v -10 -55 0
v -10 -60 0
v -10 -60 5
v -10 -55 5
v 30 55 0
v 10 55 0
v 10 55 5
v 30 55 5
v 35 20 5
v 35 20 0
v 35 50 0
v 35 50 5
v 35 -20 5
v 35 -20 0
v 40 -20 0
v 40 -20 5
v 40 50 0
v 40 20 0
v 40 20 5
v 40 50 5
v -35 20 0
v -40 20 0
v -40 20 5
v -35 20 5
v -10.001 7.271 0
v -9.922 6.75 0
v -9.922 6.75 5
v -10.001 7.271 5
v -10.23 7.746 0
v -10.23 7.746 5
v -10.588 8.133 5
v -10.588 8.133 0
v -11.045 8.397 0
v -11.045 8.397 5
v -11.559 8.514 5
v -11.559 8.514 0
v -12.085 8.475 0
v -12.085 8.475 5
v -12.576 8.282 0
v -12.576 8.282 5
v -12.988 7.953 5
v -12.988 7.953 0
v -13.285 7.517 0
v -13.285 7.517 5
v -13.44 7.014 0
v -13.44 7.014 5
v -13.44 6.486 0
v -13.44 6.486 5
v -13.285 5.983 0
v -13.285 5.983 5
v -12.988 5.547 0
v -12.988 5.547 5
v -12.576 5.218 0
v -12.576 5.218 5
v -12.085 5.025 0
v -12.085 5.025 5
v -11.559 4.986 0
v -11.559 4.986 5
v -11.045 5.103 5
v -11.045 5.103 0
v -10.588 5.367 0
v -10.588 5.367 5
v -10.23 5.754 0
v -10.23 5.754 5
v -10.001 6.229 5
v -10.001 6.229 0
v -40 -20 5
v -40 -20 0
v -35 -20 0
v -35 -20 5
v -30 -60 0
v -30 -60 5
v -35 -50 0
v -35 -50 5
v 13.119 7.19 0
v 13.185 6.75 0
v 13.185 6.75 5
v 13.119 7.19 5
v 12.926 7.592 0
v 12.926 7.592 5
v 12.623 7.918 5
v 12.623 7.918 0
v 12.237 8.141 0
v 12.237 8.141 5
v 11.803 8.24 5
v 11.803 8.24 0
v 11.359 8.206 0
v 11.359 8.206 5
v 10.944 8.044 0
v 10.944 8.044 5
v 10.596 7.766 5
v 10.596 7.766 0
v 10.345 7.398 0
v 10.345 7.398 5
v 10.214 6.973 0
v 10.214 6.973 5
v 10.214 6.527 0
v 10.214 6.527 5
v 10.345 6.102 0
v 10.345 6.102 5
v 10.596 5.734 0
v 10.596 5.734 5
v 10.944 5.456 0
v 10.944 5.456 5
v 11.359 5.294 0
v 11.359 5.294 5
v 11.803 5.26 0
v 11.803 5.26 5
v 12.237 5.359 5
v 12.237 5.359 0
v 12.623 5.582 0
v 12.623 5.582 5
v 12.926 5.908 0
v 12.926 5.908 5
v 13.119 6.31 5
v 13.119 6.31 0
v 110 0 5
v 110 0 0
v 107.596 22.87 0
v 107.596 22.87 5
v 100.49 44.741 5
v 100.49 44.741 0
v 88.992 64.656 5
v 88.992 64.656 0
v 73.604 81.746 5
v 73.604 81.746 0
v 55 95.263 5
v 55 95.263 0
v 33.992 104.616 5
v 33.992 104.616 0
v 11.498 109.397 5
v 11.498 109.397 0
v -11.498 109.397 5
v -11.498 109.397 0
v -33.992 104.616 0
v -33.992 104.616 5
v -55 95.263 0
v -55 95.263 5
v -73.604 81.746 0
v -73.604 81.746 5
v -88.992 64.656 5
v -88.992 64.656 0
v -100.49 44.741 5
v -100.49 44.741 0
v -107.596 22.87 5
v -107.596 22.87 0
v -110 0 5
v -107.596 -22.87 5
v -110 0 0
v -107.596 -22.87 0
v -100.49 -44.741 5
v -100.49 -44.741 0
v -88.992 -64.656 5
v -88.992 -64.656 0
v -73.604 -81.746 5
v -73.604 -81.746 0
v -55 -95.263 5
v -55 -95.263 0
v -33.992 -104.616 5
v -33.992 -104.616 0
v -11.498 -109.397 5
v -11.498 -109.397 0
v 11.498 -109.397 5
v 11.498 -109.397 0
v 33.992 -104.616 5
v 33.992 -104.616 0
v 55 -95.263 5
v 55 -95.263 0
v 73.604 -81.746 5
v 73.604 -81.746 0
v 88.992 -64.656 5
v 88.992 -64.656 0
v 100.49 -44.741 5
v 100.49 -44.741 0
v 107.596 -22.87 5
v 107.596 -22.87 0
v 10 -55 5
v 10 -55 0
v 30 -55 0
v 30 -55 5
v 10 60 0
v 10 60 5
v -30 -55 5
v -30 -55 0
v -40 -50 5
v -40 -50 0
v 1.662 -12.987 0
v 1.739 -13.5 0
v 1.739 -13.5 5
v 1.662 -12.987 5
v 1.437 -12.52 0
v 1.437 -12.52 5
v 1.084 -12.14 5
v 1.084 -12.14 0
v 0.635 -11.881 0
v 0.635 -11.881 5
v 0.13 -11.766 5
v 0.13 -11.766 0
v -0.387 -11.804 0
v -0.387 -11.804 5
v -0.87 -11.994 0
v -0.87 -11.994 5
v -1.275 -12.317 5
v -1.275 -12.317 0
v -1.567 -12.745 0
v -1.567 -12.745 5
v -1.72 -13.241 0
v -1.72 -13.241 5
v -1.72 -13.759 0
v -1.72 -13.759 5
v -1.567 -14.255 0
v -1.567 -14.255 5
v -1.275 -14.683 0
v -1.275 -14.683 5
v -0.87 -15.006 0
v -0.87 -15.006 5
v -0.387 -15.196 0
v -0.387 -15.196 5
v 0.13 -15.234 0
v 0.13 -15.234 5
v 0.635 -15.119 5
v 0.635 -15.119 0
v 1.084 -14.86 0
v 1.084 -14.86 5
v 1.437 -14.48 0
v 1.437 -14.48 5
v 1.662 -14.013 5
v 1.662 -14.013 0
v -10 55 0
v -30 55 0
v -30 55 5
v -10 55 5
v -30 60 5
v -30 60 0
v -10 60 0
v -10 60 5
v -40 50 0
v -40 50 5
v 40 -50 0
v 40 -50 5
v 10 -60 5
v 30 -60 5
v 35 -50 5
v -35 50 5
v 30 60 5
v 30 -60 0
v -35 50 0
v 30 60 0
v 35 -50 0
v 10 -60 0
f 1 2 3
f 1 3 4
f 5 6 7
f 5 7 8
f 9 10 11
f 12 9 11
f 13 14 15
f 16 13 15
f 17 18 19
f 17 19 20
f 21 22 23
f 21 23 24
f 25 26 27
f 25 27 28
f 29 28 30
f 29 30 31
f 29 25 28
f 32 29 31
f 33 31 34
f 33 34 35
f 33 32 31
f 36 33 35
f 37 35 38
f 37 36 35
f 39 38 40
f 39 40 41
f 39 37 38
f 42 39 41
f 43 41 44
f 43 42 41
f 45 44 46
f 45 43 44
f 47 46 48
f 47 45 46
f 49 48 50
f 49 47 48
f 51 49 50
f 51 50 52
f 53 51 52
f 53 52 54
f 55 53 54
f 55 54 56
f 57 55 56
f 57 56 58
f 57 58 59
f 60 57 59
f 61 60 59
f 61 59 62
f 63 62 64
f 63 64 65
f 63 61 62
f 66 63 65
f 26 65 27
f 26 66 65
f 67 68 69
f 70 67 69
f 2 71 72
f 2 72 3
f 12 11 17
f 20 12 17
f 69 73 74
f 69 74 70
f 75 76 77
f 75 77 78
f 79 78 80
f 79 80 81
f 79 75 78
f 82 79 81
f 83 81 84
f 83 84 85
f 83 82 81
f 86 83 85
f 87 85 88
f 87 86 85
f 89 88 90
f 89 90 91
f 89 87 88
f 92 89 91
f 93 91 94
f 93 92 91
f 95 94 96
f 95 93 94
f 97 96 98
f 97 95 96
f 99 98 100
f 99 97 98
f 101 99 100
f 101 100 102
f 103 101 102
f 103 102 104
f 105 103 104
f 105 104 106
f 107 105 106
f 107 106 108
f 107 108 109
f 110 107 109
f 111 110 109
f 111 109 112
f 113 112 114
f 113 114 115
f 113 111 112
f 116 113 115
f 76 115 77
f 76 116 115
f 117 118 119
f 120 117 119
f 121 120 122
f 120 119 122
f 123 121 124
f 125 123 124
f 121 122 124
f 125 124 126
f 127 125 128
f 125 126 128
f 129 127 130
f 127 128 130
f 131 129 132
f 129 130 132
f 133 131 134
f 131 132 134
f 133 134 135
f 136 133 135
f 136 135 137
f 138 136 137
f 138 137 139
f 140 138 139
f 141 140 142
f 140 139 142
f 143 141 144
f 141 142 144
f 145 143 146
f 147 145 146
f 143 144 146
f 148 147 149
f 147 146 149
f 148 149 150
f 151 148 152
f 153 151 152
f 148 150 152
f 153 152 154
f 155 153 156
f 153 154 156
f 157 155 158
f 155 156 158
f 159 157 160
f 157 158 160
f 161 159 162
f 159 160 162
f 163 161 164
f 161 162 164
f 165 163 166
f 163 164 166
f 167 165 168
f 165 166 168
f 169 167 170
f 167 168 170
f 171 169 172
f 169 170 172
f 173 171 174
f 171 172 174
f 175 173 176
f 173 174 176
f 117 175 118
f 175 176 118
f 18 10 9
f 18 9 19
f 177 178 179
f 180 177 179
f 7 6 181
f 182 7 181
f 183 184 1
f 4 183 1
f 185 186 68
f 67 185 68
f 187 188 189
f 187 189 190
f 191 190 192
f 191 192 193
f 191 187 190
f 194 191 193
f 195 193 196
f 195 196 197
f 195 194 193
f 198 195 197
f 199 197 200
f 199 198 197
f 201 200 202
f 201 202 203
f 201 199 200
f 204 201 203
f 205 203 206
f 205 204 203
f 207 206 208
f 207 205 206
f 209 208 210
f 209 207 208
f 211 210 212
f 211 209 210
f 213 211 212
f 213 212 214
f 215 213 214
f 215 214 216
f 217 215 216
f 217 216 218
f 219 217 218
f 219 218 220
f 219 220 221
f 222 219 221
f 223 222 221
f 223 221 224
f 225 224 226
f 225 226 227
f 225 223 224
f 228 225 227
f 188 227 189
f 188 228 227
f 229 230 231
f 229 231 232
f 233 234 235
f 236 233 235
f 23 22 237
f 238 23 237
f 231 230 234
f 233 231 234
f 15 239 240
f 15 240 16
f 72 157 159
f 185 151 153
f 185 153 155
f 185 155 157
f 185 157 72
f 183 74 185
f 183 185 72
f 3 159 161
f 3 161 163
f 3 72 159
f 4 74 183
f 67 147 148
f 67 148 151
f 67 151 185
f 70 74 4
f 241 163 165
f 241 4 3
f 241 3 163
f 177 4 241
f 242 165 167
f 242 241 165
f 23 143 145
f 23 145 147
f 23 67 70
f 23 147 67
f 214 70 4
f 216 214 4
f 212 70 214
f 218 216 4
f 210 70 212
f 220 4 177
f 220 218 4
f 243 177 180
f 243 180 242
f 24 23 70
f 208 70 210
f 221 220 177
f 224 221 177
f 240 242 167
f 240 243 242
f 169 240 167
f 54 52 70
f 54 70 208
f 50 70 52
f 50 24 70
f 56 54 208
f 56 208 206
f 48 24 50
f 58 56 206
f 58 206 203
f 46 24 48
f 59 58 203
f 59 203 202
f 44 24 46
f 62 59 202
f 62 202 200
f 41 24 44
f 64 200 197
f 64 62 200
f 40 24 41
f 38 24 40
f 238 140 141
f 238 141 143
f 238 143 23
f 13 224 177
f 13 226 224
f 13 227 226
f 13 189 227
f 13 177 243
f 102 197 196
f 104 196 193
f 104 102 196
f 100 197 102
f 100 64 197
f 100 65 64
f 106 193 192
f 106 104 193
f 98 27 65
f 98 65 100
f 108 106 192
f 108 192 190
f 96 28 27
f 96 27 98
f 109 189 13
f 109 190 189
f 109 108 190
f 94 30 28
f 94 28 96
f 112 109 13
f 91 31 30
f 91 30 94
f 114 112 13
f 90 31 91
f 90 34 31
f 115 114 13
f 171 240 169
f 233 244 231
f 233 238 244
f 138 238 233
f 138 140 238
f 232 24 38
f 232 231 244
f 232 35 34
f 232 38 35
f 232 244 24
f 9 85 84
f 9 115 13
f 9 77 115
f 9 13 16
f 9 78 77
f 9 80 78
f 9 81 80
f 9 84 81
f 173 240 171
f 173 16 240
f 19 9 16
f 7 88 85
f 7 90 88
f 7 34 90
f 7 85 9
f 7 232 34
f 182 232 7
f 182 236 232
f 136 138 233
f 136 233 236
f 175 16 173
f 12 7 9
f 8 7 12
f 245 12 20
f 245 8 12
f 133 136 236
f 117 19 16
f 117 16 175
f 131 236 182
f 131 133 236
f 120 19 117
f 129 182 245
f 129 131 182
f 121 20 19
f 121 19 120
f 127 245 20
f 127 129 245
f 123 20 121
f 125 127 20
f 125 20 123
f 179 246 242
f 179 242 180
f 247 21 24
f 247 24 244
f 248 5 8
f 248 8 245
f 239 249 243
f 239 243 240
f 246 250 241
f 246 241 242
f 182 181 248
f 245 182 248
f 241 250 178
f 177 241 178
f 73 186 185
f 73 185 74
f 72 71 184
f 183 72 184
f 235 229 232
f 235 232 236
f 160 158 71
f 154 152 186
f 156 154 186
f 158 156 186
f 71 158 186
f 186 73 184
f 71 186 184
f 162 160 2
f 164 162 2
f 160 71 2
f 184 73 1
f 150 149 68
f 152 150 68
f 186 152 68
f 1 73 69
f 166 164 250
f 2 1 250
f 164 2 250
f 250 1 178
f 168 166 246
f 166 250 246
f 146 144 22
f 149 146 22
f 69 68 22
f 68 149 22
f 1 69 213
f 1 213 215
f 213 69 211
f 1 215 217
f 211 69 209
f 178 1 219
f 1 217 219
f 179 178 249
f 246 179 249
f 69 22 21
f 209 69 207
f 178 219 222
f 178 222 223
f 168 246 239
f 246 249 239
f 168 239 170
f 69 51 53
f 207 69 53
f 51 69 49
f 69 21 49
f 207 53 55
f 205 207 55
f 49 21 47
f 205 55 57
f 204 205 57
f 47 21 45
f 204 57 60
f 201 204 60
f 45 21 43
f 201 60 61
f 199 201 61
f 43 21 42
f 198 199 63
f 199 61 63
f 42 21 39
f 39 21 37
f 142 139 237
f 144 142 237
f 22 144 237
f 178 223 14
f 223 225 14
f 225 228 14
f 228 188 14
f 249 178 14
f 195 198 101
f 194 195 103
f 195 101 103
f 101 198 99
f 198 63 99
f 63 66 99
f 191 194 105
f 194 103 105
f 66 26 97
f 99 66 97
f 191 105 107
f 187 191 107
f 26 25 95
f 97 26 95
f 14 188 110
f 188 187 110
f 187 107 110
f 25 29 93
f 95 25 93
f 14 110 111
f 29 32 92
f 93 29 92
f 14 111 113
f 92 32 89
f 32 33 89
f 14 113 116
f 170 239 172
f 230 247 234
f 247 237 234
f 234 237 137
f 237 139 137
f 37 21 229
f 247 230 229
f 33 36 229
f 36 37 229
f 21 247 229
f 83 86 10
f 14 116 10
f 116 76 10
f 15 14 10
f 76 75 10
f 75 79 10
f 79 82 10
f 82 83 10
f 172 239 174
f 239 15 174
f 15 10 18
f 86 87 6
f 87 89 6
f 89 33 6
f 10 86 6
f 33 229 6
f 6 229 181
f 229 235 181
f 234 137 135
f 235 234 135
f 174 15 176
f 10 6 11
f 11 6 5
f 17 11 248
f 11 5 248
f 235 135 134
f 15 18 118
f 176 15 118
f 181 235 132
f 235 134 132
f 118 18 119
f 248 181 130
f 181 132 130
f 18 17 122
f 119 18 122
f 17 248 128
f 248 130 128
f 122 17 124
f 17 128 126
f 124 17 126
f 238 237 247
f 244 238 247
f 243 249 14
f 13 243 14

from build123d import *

# Parameters (mm, degrees)
SKETCH1_R           = 110
SKETCH1_R_2         = 1.768866344
SKETCH1_R_3         = 1.493909961
SKETCH1_R_4         = 1.739193209
SKETCH1_W           = 20
SKETCH1_H           = 5
SKETCH1_W_2         = 5
SKETCH1_H_2         = 30
BOSS_EXTRUDE1_DEPTH = 5


with BuildPart() as part:
    # Sketch1 → Boss-Extrude1 (new body)
    with BuildSketch(Plane.XY):
        Circle(SKETCH1_R)
        with Locations((-11.691342951, 6.75)):
            Circle(SKETCH1_R_2, mode=Mode.SUBTRACT)
        with Locations((11.691342951, 6.75)):
            Circle(SKETCH1_R_3, mode=Mode.SUBTRACT)
        with Locations((0, -13.5)):
            Circle(SKETCH1_R_4, mode=Mode.SUBTRACT)
        with Locations((-20, 57.5)):
            Rectangle(SKETCH1_W, SKETCH1_H, mode=Mode.SUBTRACT)
        with Locations((20, 57.5)):
            Rectangle(SKETCH1_W, SKETCH1_H, mode=Mode.SUBTRACT)
        with Locations((37.5, 35)):
            Rectangle(SKETCH1_W_2, SKETCH1_H_2, mode=Mode.SUBTRACT)
        with Locations((37.5, -35)):
            Rectangle(SKETCH1_W_2, SKETCH1_H_2, mode=Mode.SUBTRACT)
        with Locations((20, -57.5)):
            Rectangle(SKETCH1_W, SKETCH1_H, mode=Mode.SUBTRACT)
        with Locations((-20, -57.5)):
            Rectangle(SKETCH1_W, SKETCH1_H, mode=Mode.SUBTRACT)
        with Locations((-37.5, -35)):
            Rectangle(SKETCH1_W_2, SKETCH1_H_2, mode=Mode.SUBTRACT)
        with Locations((-37.5, 35)):
            Rectangle(SKETCH1_W_2, SKETCH1_H_2, mode=Mode.SUBTRACT)
    extrude(amount=BOSS_EXTRUDE1_DEPTH)


solid = part.part
